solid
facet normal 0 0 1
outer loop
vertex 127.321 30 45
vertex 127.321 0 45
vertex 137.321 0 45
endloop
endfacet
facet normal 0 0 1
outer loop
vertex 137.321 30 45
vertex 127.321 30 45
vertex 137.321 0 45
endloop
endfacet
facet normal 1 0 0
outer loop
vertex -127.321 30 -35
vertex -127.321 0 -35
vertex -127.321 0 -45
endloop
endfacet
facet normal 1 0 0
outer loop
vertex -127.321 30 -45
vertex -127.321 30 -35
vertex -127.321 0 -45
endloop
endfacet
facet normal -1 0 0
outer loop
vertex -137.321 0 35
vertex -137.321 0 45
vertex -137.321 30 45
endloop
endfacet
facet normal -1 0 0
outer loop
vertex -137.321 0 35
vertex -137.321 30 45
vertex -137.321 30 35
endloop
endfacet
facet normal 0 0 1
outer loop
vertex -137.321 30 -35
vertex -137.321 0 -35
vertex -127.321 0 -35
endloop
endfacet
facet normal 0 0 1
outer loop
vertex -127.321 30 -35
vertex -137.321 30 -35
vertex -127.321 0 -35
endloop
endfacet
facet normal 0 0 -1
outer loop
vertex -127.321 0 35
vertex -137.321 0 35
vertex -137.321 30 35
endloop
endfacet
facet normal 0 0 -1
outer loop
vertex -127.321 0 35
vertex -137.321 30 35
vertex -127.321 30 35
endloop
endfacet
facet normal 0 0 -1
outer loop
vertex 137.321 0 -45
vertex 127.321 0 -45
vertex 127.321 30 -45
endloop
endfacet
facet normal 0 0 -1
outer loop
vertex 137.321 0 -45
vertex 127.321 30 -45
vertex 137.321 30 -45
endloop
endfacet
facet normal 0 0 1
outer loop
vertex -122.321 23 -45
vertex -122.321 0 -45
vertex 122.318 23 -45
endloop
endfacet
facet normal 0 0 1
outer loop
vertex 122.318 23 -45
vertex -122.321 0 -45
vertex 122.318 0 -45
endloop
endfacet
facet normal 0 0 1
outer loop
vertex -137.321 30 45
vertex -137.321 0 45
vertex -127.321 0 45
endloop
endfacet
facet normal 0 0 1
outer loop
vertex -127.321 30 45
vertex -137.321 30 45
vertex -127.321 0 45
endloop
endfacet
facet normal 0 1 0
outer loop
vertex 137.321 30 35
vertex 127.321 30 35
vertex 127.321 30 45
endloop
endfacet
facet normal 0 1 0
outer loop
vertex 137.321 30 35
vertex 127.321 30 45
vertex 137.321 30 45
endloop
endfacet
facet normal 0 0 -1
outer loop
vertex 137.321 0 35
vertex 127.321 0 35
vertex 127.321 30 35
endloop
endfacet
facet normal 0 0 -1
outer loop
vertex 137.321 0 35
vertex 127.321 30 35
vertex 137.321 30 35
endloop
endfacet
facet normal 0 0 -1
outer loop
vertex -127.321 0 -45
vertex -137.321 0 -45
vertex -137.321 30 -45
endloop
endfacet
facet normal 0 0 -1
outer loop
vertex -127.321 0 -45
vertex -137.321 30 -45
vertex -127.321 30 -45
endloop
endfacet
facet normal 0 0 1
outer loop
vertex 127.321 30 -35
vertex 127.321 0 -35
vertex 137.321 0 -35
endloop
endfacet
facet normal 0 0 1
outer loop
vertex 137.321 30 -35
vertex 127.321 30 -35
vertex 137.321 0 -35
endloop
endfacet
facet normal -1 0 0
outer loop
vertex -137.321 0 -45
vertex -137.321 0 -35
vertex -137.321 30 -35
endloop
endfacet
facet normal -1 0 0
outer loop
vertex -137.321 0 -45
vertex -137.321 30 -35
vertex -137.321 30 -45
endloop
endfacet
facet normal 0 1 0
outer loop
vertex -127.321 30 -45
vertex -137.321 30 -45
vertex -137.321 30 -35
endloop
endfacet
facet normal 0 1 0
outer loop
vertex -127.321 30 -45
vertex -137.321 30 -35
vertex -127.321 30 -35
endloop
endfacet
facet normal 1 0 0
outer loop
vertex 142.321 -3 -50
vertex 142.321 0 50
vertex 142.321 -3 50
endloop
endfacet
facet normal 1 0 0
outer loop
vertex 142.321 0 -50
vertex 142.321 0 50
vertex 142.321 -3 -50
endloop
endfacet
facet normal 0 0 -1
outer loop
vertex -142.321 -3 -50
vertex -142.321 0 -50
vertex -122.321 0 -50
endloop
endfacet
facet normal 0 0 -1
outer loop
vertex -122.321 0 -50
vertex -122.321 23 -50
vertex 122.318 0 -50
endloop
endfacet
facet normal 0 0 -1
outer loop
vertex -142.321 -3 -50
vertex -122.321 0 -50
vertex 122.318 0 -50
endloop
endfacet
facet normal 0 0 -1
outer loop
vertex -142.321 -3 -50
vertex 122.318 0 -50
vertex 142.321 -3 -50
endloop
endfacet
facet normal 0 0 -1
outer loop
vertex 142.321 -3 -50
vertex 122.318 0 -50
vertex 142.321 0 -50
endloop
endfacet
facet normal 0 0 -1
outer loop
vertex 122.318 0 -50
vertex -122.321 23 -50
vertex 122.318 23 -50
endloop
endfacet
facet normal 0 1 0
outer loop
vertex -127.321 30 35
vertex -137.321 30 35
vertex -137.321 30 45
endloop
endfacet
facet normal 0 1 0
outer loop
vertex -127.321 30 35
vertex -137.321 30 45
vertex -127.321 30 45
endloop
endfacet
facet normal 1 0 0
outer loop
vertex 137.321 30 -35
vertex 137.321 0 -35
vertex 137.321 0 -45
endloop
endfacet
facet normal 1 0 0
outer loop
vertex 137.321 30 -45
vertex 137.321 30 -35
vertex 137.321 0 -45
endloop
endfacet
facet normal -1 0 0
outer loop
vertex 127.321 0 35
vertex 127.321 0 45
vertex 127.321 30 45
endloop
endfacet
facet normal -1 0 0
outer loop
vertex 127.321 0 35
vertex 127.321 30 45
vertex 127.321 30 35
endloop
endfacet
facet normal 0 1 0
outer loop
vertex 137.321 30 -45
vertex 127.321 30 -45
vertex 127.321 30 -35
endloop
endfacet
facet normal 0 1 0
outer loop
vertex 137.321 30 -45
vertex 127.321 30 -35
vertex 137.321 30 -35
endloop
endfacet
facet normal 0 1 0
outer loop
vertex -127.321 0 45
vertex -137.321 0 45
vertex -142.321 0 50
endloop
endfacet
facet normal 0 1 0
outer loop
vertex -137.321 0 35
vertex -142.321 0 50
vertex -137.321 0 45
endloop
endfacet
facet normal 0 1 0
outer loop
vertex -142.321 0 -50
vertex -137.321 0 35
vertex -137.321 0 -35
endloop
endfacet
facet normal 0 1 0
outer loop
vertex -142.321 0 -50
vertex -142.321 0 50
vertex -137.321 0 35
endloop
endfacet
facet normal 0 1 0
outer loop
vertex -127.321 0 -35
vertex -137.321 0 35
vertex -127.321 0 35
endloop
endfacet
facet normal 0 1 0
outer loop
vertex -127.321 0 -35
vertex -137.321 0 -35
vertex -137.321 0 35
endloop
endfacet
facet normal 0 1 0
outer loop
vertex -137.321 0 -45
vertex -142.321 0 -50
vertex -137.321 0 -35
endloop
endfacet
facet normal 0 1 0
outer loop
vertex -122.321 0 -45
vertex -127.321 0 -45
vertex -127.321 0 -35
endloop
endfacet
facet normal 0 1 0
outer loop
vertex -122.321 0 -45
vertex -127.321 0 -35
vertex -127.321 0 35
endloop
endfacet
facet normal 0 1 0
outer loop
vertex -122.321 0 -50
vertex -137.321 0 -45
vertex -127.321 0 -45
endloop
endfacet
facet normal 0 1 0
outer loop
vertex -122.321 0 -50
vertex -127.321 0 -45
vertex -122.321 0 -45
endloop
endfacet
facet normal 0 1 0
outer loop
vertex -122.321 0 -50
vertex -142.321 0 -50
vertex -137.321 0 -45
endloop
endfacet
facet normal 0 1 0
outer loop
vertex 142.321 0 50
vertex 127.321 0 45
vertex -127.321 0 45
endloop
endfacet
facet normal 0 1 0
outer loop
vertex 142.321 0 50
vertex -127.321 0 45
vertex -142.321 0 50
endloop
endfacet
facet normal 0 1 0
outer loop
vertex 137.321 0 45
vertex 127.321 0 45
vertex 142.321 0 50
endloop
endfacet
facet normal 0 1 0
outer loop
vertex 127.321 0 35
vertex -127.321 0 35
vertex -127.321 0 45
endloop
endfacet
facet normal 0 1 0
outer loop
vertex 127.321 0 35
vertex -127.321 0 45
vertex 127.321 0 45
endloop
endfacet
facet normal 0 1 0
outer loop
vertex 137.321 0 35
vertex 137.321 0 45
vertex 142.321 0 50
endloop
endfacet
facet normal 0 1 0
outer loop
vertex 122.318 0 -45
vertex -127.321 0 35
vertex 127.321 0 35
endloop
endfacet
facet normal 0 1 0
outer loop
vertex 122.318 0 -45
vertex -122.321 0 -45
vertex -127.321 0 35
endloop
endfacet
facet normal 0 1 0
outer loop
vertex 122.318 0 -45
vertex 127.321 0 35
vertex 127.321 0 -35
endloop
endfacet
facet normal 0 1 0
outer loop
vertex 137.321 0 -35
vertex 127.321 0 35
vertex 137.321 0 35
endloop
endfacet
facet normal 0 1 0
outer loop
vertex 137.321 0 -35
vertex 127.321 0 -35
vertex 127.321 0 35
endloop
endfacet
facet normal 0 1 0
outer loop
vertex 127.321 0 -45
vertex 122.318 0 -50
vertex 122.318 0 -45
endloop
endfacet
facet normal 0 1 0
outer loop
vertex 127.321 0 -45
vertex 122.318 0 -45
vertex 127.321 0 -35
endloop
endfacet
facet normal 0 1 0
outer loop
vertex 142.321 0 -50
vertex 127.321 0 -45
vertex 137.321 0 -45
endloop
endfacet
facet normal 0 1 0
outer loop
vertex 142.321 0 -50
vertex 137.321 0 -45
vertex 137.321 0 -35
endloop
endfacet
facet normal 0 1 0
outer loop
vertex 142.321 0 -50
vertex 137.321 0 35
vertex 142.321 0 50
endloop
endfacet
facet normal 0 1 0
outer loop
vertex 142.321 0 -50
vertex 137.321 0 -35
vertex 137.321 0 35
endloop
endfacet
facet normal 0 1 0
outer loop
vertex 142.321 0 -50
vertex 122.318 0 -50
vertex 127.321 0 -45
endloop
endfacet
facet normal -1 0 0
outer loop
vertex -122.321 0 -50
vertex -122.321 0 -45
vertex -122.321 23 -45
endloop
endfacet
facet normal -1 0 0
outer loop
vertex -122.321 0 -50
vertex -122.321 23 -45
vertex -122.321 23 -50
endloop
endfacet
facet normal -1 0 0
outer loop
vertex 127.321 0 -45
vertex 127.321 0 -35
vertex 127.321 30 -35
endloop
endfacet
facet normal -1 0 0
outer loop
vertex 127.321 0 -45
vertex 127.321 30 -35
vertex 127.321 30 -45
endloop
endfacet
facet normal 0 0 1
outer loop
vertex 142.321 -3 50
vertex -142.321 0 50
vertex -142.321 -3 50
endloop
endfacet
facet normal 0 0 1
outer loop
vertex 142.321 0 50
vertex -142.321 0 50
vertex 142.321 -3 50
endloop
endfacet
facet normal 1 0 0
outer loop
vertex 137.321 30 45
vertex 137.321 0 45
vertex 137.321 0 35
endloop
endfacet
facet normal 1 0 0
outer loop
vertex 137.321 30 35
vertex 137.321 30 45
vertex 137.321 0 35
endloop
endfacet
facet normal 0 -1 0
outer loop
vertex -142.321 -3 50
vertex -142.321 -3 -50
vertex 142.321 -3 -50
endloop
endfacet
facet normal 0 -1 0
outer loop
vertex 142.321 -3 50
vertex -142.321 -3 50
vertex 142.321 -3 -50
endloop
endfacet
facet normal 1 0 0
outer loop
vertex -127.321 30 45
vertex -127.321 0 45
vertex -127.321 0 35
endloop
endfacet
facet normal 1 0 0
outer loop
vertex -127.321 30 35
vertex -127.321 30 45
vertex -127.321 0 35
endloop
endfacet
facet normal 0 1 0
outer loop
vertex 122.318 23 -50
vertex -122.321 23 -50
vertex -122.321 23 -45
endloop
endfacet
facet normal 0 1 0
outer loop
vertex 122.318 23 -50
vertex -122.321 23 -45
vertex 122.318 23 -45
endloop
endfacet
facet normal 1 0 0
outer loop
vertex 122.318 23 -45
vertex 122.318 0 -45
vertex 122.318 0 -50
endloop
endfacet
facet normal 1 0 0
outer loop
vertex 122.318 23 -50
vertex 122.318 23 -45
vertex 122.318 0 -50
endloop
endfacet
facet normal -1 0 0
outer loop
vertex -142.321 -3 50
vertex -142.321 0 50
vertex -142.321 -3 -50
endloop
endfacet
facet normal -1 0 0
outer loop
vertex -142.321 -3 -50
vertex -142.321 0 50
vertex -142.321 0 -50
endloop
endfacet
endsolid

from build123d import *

# Parameters (mm, degrees)
SKETCH_2_W        = 10
SKETCH_2_H        = 10
EXTRUDE_1_DEPTH   = 30
EXTRUDE_1_2_DEPTH = 30
EXTRUDE_1_3_DEPTH = 30
EXTRUDE_1_4_DEPTH = 30
SKETCH_3_W        = 284.641016152
SKETCH_3_H        = 100
EXTRUDE_2_DEPTH   = 3
SKETCH_4_W        = 244.638026471
SKETCH_4_H        = 5
EXTRUDE_3_DEPTH   = 23


with BuildPart() as part:
    # 草图2 → 凸台-拉伸1 (new body)
    with BuildSketch(Plane(origin=(0, 0, 0), x_dir=(1, 0, 0), z_dir=(0, 1, 0))):
        with Locations((-132.320508076, 40)):
            Rectangle(SKETCH_2_W, SKETCH_2_H)
    extrude(amount=EXTRUDE_1_DEPTH)



with BuildPart() as body_2:
    # 草图2 → Extrude 1 2 (new body)
    with BuildSketch(Plane(origin=(0, 0, 0), x_dir=(1, 0, 0), z_dir=(0, 1, 0))):
        with Locations((-132.320508076, -40)):
            Rectangle(SKETCH_2_W, SKETCH_2_H)
    extrude(amount=EXTRUDE_1_2_DEPTH)


with BuildPart() as body_3:
    # 草图2 → Extrude 1 3 (new body)
    with BuildSketch(Plane(origin=(0, 0, 0), x_dir=(1, 0, 0), z_dir=(0, 1, 0))):
        with Locations((132.320508076, -40)):
            Rectangle(SKETCH_2_W, SKETCH_2_H)
    extrude(amount=EXTRUDE_1_3_DEPTH)


with BuildPart() as body_4:
    # 草图2 → Extrude 1 4 (new body)
    with BuildSketch(Plane(origin=(0, 0, 0), x_dir=(1, 0, 0), z_dir=(0, 1, 0))):
        with Locations((132.320508076, 40)):
            Rectangle(SKETCH_2_W, SKETCH_2_H)
    extrude(amount=EXTRUDE_1_4_DEPTH)


with BuildPart() as part_1:
    add(part.part)

    add(body_2.part)  # 凸台-拉伸2 merges body 2

    add(body_3.part)  # 凸台-拉伸2 merges body 3

    add(body_4.part)  # 凸台-拉伸2 merges body 4
    # 草图3 → 凸台-拉伸2 (add)
    with BuildSketch(Plane(origin=(0, 0, 0), x_dir=(1, 0, 0), z_dir=(0, 1, 0))):
        Rectangle(SKETCH_3_W, SKETCH_3_H)
    extrude(amount=-EXTRUDE_2_DEPTH)

    # 草图4 → 凸台-拉伸3 (add)
    with BuildSketch(Plane(origin=(0, 0, 0), x_dir=(1, 0, 0), z_dir=(0, 1, 0))):
        with Locations((-0.001494841, 47.5)):
            Rectangle(SKETCH_4_W, SKETCH_4_H)
    extrude(amount=EXTRUDE_3_DEPTH)


solid = part_1.part
